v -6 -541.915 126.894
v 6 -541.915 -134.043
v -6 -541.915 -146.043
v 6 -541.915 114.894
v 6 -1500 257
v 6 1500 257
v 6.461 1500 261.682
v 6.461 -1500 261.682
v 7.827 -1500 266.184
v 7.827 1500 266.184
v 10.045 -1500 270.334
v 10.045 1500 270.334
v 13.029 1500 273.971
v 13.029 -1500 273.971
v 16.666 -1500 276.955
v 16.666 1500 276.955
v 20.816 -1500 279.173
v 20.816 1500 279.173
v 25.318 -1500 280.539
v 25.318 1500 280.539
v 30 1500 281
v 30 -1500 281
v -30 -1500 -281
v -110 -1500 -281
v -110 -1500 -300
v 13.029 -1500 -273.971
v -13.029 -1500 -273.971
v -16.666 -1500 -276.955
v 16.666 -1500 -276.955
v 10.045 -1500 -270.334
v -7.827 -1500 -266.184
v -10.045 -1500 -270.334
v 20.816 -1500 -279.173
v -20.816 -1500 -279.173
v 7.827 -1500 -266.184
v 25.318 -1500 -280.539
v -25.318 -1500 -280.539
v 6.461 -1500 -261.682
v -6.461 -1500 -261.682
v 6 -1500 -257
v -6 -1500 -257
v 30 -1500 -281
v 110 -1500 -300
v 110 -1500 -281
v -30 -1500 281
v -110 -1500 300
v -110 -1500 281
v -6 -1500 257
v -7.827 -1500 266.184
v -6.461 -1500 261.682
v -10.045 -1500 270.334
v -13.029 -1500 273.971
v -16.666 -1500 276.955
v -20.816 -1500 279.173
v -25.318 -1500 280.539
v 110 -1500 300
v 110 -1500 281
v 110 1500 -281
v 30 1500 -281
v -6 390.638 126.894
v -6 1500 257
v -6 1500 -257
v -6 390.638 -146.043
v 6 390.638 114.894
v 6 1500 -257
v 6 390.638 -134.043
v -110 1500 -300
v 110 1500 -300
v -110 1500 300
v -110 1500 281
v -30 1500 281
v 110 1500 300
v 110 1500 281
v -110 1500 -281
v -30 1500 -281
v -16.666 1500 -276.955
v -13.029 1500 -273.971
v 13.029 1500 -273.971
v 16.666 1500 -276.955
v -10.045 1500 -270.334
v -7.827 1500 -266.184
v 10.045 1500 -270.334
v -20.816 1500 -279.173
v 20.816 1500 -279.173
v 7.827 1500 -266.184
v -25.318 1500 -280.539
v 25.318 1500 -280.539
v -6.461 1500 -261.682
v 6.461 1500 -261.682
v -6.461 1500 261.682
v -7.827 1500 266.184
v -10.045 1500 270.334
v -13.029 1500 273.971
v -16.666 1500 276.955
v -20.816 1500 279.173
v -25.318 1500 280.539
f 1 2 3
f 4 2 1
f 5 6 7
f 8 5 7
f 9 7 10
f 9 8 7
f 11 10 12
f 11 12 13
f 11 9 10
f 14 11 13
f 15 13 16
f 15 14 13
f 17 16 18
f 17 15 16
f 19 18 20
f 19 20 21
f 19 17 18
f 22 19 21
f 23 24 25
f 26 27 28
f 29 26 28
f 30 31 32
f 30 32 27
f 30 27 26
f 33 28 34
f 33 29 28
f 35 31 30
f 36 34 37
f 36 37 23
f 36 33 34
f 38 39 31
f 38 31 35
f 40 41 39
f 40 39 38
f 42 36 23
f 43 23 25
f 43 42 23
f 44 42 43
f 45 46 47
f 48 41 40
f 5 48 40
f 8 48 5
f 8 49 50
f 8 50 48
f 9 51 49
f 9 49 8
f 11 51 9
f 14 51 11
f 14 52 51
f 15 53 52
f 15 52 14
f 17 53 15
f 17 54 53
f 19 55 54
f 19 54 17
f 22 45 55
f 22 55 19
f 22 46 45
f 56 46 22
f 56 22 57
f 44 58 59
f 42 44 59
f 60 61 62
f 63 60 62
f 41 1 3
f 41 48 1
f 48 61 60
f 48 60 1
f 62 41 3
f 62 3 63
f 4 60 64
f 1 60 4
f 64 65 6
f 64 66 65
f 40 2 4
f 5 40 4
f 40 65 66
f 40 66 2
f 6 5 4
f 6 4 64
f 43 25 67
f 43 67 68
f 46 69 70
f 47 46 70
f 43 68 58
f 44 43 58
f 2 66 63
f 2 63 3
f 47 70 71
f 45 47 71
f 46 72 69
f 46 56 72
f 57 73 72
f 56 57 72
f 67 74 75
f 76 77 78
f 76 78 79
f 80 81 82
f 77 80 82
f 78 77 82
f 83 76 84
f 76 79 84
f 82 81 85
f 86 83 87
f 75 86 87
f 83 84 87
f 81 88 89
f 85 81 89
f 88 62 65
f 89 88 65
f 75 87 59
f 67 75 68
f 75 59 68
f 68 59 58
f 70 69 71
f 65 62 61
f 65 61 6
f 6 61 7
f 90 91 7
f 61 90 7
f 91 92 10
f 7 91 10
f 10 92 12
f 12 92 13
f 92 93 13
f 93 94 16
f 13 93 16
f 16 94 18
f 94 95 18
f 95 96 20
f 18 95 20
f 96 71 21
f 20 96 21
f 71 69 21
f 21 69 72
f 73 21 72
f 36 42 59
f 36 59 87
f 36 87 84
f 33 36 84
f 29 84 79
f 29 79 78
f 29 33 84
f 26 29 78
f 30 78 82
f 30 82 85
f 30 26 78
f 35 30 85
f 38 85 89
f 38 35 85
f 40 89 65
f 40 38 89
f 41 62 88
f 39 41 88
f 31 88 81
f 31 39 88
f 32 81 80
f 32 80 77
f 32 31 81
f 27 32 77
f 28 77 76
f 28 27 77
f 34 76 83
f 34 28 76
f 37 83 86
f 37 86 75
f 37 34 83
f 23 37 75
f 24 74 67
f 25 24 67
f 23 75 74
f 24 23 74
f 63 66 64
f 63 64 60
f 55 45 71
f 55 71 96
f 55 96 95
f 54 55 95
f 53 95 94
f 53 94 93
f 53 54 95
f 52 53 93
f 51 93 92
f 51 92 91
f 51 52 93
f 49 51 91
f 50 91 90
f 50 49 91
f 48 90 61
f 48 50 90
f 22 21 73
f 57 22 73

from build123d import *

# Parameters (mm, degrees)
F1_DEPTH      = 1500
F4_W          = 932.5531721115
F4_H          = 248.9361688495
F5_DEPTH      = 110.001
F5_DEPTH_BACK = 110.001
F6_SIZE       = 11.99999


# Not quite as in the source:
# - a fillet or chamfer is up to 0.001 mm smaller than in the source, because OpenCascade refuses the exact size
# - a feature of the source that left no trace in its solid (it failed there, or was rolled back) is left out


with BuildPart() as f1:
    # F0 (on Front) → F1 (new body, symmetric)
    with BuildSketch(Plane.XZ):
        with BuildLine():
            Line((110, 300), (-110, 300))
            Line((-110, 300), (-110, 281))
            Line((-110, 281), (-30, 281))
            ThreePointArc((-30, 281), (-13.0294372515, 273.9705627485), (-6, 257))
            Line((-6, 257), (-6, 0))
            Line((-6, 0), (-6, -257))
            ThreePointArc((-6, -257), (-13.0294372515, -273.9705627485), (-30, -281))
            Line((-30, -281), (-110, -281))
            Line((-110, -281), (-110, -300))
            Line((-110, -300), (110, -300))
            Line((110, -300), (110, -281))
            Line((110, -281), (30, -281))
            ThreePointArc((30, -281), (13.0294372515, -273.9705627485), (6, -257))
            Line((6, -257), (6, 0))
            Line((6, 0), (6, 257))
            ThreePointArc((6, 257), (13.0294372515, 273.9705627485), (30, 281))
            Line((30, 281), (110, 281))
            Line((110, 281), (110, 300))
        make_face()
    extrude(amount=F1_DEPTH, both=True)

    # F4 (on Right) → F5 (cut, two sides)
    with BuildSketch(Plane.YZ) as f5_sk:
        with Locations((-75.63829422, -9.5744766295)):
            Rectangle(F4_W, F4_H)
    extrude(amount=-F5_DEPTH, mode=Mode.SUBTRACT)
    extrude(f5_sk.sketch, amount=F5_DEPTH_BACK, mode=Mode.SUBTRACT)

    # F6 (size 12 in the source; OpenCascade refuses exactly that, so slightly less here)
    f6_edges = [f1.edges().sort_by_distance(p)[0] for p in [
        (-6, -75.638294, 114.893608),
        (-6, -75.638294, -134.042561),
    ]]
    chamfer(f6_edges, length=F6_SIZE)


solid = f1.part
